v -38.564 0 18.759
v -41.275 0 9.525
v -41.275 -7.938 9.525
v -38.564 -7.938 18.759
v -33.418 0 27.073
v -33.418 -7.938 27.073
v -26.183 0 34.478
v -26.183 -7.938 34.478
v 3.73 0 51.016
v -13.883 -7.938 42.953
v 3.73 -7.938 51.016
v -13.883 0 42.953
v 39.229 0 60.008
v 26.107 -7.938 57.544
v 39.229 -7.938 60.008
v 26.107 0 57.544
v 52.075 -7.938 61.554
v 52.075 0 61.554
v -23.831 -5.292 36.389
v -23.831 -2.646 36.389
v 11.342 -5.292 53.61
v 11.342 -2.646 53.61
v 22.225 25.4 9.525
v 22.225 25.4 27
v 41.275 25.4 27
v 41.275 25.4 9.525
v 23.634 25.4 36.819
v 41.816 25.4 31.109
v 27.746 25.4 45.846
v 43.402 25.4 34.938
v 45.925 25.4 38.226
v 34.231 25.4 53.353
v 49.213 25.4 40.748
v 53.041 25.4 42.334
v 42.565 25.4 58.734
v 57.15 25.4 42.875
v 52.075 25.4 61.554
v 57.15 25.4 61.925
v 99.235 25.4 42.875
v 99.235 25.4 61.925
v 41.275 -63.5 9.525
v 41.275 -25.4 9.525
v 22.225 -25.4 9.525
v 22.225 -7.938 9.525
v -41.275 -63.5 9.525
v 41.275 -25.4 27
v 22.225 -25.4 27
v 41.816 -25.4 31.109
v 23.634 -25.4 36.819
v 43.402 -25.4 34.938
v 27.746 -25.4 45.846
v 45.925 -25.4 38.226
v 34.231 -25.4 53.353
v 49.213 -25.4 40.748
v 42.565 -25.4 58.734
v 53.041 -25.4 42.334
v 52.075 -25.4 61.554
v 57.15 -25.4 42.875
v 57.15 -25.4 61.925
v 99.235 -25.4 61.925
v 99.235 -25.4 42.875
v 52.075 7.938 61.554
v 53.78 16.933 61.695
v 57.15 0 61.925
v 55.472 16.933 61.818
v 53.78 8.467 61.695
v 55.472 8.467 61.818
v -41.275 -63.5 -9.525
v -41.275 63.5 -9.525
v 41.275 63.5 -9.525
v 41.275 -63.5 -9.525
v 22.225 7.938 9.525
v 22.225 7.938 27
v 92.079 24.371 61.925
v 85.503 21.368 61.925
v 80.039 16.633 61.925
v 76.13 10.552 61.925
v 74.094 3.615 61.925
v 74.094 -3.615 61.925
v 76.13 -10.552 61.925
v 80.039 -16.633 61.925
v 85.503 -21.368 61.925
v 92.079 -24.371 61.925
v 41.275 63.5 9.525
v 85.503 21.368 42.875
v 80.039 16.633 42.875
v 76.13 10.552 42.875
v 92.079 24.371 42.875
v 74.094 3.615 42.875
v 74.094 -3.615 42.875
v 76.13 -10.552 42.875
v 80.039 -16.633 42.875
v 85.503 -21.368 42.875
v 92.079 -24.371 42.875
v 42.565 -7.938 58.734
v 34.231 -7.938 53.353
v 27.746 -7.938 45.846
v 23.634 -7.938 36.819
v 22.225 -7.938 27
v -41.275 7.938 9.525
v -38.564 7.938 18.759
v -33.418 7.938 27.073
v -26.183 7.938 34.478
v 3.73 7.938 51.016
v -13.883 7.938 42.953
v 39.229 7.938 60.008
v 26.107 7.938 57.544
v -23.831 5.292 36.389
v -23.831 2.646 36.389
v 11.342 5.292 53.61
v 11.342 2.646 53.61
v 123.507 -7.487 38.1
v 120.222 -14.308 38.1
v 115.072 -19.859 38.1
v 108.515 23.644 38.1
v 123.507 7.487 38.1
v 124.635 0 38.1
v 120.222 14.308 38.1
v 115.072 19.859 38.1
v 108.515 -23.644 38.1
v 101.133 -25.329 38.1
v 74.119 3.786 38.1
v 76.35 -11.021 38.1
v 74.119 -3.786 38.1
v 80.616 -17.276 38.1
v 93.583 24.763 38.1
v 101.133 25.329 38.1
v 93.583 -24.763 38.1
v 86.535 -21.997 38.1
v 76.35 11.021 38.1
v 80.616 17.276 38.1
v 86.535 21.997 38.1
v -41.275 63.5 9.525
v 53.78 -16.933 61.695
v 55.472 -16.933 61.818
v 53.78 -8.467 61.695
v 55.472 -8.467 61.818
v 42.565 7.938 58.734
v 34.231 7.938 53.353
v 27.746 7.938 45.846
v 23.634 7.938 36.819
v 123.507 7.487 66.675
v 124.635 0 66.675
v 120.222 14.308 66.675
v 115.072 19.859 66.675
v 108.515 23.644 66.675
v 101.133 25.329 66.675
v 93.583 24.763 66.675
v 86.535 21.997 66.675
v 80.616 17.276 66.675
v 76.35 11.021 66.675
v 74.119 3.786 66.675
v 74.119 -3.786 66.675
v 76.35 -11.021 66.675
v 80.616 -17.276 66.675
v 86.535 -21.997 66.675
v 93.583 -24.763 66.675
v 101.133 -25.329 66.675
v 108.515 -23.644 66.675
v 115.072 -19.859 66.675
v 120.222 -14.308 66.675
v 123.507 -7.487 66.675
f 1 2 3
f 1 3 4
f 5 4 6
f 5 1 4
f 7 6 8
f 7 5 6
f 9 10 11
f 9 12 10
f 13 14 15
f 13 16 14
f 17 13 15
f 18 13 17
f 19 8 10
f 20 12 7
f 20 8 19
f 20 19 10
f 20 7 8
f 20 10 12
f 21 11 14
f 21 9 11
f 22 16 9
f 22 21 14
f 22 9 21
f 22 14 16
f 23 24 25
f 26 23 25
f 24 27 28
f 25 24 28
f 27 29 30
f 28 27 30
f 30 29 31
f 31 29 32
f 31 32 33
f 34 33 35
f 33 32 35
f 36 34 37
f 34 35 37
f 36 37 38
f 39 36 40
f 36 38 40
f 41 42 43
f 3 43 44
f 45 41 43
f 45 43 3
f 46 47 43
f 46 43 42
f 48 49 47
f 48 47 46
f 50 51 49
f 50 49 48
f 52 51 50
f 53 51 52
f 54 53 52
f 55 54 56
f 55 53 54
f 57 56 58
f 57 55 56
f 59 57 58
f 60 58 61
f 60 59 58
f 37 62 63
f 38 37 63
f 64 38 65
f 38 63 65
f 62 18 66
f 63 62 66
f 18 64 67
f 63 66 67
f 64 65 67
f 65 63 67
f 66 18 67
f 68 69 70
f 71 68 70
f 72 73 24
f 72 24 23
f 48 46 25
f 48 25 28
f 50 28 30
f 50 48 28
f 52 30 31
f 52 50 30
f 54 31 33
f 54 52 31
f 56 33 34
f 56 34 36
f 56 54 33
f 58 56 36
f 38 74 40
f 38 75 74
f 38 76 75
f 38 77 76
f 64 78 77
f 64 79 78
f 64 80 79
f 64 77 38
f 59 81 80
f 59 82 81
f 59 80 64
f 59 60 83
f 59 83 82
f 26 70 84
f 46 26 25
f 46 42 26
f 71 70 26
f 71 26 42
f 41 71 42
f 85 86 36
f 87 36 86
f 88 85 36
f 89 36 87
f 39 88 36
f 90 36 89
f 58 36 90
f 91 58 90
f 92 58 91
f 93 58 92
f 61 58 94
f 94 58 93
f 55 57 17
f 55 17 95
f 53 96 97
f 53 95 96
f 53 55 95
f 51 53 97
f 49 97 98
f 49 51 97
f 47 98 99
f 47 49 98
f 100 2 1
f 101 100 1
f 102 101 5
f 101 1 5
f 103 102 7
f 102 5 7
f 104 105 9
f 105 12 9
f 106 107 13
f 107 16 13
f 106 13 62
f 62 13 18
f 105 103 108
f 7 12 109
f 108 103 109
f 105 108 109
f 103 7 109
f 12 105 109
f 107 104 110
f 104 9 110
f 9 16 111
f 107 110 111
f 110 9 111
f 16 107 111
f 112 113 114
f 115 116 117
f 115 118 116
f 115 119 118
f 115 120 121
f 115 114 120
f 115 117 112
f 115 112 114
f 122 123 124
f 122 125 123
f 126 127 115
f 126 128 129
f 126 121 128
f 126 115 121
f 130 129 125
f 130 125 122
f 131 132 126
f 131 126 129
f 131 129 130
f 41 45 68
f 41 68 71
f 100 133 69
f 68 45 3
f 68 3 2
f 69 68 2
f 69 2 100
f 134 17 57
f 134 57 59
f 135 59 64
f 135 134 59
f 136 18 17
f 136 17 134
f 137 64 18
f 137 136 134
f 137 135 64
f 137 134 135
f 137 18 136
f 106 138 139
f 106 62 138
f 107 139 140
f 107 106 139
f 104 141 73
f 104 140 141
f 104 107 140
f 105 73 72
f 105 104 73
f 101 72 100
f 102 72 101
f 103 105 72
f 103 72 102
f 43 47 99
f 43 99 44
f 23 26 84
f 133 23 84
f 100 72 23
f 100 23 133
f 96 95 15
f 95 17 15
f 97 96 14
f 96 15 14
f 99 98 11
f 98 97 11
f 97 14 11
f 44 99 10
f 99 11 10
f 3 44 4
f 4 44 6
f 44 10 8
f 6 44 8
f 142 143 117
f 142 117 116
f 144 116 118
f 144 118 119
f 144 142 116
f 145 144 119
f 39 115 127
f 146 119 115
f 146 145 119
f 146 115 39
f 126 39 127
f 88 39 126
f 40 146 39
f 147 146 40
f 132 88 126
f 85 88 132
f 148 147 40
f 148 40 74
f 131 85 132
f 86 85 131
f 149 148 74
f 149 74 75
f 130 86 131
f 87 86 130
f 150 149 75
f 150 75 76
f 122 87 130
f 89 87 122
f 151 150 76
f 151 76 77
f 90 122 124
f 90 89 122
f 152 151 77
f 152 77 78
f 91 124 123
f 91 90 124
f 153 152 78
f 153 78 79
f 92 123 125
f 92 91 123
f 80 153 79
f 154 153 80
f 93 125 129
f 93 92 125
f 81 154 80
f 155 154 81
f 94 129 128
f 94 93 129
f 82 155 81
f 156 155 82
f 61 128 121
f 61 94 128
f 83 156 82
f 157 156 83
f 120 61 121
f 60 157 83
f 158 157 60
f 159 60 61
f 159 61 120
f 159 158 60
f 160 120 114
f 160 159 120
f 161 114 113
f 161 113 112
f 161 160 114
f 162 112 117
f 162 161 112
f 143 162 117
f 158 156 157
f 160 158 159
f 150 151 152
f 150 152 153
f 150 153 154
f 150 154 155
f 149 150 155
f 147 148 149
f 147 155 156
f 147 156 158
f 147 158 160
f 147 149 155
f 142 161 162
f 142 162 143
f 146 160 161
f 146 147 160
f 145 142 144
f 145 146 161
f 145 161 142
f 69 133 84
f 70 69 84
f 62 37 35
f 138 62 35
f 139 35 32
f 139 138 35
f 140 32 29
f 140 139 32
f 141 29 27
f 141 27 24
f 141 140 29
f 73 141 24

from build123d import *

# Parameters (mm, degrees)
F1_DEPTH = 63.5
F2_DEPTH = 7.9375
F0_W     = 25.4
F0_H     = 19.05
F3_DEPTH = 25.4


with BuildPart() as f1:
    # F0 (on Front) → F1 (new body, symmetric)
    with BuildSketch(Plane.XZ):
        Polygon((22.225, 9.525), (-41.275, 9.525), (-41.275, -9.525), (41.275, -9.525), (41.275, 9.525), align=None)
    extrude(amount=F1_DEPTH, both=True)

    # F0 (on Front) → F2 (join, symmetric)
    with BuildSketch(Plane.XZ):
        with BuildLine():
            add(Edge.make_bspline(
                [(-41.275, 9.525), (-36.750946, 41.332115), (12.617621, 58.127224), (52.07476, 61.55447)],
                knots=[0, 0, 0, 0, 106.867946, 106.867946, 106.867946, 106.867946], degree=3))
            Line((-41.275, 9.525), (22.225, 9.525))
            Line((22.225, 9.525), (22.225, 27.0002))
            ThreePointArc((22.225, 27.0002), (30.72077, 49.831132), (52.07476, 61.55447))
        make_face()
    extrude(amount=F2_DEPTH, both=True)

    # F0 (on Front) → F3 (join, symmetric)
    with BuildSketch(Plane.XZ):
        with BuildLine():
            Line((22.225, 27.0002), (22.225, 9.525))
            Line((22.225, 9.525), (41.275, 9.525))
            Line((41.275, 9.525), (41.275, 27.0002))
            ThreePointArc((41.275, 27.0002), (45.92468, 38.22552), (57.15, 42.8752))
            Line((57.15, 42.8752), (73.83506, 42.8752))
            Line((73.83506, 42.8752), (73.83506, 61.9252))
            Line((73.83506, 61.9252), (57.15, 61.9252))
            add(Edge.make_bspline(
                [(52.07476, 61.55447), (53.786654, 61.703165), (55.479892, 61.826697), (57.15, 61.9252)],
                knots=[106.867946, 106.867946, 106.867946, 106.867946, 111.504536, 111.504536, 111.504536, 111.504536], degree=3))
            ThreePointArc((52.07476, 61.55447), (30.72077, 49.831132), (22.225, 27.0002))
        make_face()
        with Locations((86.53506, 52.4002)):
            Rectangle(F0_W, F0_H)
    extrude(amount=F3_DEPTH, both=True)

    # F0 (on Front) → F4 (revolve)
    with BuildSketch(Plane.XZ):
        Polygon((99.23506, 66.675), (99.23506, 61.9252), (99.23506, 42.8752), (99.23506, 38.1), (124.63506, 38.1), (124.63506, 66.675), align=None)
    revolve(axis=Axis((99.23506, 0, 52.3875), (0, 0, 1)))


solid = f1.part
